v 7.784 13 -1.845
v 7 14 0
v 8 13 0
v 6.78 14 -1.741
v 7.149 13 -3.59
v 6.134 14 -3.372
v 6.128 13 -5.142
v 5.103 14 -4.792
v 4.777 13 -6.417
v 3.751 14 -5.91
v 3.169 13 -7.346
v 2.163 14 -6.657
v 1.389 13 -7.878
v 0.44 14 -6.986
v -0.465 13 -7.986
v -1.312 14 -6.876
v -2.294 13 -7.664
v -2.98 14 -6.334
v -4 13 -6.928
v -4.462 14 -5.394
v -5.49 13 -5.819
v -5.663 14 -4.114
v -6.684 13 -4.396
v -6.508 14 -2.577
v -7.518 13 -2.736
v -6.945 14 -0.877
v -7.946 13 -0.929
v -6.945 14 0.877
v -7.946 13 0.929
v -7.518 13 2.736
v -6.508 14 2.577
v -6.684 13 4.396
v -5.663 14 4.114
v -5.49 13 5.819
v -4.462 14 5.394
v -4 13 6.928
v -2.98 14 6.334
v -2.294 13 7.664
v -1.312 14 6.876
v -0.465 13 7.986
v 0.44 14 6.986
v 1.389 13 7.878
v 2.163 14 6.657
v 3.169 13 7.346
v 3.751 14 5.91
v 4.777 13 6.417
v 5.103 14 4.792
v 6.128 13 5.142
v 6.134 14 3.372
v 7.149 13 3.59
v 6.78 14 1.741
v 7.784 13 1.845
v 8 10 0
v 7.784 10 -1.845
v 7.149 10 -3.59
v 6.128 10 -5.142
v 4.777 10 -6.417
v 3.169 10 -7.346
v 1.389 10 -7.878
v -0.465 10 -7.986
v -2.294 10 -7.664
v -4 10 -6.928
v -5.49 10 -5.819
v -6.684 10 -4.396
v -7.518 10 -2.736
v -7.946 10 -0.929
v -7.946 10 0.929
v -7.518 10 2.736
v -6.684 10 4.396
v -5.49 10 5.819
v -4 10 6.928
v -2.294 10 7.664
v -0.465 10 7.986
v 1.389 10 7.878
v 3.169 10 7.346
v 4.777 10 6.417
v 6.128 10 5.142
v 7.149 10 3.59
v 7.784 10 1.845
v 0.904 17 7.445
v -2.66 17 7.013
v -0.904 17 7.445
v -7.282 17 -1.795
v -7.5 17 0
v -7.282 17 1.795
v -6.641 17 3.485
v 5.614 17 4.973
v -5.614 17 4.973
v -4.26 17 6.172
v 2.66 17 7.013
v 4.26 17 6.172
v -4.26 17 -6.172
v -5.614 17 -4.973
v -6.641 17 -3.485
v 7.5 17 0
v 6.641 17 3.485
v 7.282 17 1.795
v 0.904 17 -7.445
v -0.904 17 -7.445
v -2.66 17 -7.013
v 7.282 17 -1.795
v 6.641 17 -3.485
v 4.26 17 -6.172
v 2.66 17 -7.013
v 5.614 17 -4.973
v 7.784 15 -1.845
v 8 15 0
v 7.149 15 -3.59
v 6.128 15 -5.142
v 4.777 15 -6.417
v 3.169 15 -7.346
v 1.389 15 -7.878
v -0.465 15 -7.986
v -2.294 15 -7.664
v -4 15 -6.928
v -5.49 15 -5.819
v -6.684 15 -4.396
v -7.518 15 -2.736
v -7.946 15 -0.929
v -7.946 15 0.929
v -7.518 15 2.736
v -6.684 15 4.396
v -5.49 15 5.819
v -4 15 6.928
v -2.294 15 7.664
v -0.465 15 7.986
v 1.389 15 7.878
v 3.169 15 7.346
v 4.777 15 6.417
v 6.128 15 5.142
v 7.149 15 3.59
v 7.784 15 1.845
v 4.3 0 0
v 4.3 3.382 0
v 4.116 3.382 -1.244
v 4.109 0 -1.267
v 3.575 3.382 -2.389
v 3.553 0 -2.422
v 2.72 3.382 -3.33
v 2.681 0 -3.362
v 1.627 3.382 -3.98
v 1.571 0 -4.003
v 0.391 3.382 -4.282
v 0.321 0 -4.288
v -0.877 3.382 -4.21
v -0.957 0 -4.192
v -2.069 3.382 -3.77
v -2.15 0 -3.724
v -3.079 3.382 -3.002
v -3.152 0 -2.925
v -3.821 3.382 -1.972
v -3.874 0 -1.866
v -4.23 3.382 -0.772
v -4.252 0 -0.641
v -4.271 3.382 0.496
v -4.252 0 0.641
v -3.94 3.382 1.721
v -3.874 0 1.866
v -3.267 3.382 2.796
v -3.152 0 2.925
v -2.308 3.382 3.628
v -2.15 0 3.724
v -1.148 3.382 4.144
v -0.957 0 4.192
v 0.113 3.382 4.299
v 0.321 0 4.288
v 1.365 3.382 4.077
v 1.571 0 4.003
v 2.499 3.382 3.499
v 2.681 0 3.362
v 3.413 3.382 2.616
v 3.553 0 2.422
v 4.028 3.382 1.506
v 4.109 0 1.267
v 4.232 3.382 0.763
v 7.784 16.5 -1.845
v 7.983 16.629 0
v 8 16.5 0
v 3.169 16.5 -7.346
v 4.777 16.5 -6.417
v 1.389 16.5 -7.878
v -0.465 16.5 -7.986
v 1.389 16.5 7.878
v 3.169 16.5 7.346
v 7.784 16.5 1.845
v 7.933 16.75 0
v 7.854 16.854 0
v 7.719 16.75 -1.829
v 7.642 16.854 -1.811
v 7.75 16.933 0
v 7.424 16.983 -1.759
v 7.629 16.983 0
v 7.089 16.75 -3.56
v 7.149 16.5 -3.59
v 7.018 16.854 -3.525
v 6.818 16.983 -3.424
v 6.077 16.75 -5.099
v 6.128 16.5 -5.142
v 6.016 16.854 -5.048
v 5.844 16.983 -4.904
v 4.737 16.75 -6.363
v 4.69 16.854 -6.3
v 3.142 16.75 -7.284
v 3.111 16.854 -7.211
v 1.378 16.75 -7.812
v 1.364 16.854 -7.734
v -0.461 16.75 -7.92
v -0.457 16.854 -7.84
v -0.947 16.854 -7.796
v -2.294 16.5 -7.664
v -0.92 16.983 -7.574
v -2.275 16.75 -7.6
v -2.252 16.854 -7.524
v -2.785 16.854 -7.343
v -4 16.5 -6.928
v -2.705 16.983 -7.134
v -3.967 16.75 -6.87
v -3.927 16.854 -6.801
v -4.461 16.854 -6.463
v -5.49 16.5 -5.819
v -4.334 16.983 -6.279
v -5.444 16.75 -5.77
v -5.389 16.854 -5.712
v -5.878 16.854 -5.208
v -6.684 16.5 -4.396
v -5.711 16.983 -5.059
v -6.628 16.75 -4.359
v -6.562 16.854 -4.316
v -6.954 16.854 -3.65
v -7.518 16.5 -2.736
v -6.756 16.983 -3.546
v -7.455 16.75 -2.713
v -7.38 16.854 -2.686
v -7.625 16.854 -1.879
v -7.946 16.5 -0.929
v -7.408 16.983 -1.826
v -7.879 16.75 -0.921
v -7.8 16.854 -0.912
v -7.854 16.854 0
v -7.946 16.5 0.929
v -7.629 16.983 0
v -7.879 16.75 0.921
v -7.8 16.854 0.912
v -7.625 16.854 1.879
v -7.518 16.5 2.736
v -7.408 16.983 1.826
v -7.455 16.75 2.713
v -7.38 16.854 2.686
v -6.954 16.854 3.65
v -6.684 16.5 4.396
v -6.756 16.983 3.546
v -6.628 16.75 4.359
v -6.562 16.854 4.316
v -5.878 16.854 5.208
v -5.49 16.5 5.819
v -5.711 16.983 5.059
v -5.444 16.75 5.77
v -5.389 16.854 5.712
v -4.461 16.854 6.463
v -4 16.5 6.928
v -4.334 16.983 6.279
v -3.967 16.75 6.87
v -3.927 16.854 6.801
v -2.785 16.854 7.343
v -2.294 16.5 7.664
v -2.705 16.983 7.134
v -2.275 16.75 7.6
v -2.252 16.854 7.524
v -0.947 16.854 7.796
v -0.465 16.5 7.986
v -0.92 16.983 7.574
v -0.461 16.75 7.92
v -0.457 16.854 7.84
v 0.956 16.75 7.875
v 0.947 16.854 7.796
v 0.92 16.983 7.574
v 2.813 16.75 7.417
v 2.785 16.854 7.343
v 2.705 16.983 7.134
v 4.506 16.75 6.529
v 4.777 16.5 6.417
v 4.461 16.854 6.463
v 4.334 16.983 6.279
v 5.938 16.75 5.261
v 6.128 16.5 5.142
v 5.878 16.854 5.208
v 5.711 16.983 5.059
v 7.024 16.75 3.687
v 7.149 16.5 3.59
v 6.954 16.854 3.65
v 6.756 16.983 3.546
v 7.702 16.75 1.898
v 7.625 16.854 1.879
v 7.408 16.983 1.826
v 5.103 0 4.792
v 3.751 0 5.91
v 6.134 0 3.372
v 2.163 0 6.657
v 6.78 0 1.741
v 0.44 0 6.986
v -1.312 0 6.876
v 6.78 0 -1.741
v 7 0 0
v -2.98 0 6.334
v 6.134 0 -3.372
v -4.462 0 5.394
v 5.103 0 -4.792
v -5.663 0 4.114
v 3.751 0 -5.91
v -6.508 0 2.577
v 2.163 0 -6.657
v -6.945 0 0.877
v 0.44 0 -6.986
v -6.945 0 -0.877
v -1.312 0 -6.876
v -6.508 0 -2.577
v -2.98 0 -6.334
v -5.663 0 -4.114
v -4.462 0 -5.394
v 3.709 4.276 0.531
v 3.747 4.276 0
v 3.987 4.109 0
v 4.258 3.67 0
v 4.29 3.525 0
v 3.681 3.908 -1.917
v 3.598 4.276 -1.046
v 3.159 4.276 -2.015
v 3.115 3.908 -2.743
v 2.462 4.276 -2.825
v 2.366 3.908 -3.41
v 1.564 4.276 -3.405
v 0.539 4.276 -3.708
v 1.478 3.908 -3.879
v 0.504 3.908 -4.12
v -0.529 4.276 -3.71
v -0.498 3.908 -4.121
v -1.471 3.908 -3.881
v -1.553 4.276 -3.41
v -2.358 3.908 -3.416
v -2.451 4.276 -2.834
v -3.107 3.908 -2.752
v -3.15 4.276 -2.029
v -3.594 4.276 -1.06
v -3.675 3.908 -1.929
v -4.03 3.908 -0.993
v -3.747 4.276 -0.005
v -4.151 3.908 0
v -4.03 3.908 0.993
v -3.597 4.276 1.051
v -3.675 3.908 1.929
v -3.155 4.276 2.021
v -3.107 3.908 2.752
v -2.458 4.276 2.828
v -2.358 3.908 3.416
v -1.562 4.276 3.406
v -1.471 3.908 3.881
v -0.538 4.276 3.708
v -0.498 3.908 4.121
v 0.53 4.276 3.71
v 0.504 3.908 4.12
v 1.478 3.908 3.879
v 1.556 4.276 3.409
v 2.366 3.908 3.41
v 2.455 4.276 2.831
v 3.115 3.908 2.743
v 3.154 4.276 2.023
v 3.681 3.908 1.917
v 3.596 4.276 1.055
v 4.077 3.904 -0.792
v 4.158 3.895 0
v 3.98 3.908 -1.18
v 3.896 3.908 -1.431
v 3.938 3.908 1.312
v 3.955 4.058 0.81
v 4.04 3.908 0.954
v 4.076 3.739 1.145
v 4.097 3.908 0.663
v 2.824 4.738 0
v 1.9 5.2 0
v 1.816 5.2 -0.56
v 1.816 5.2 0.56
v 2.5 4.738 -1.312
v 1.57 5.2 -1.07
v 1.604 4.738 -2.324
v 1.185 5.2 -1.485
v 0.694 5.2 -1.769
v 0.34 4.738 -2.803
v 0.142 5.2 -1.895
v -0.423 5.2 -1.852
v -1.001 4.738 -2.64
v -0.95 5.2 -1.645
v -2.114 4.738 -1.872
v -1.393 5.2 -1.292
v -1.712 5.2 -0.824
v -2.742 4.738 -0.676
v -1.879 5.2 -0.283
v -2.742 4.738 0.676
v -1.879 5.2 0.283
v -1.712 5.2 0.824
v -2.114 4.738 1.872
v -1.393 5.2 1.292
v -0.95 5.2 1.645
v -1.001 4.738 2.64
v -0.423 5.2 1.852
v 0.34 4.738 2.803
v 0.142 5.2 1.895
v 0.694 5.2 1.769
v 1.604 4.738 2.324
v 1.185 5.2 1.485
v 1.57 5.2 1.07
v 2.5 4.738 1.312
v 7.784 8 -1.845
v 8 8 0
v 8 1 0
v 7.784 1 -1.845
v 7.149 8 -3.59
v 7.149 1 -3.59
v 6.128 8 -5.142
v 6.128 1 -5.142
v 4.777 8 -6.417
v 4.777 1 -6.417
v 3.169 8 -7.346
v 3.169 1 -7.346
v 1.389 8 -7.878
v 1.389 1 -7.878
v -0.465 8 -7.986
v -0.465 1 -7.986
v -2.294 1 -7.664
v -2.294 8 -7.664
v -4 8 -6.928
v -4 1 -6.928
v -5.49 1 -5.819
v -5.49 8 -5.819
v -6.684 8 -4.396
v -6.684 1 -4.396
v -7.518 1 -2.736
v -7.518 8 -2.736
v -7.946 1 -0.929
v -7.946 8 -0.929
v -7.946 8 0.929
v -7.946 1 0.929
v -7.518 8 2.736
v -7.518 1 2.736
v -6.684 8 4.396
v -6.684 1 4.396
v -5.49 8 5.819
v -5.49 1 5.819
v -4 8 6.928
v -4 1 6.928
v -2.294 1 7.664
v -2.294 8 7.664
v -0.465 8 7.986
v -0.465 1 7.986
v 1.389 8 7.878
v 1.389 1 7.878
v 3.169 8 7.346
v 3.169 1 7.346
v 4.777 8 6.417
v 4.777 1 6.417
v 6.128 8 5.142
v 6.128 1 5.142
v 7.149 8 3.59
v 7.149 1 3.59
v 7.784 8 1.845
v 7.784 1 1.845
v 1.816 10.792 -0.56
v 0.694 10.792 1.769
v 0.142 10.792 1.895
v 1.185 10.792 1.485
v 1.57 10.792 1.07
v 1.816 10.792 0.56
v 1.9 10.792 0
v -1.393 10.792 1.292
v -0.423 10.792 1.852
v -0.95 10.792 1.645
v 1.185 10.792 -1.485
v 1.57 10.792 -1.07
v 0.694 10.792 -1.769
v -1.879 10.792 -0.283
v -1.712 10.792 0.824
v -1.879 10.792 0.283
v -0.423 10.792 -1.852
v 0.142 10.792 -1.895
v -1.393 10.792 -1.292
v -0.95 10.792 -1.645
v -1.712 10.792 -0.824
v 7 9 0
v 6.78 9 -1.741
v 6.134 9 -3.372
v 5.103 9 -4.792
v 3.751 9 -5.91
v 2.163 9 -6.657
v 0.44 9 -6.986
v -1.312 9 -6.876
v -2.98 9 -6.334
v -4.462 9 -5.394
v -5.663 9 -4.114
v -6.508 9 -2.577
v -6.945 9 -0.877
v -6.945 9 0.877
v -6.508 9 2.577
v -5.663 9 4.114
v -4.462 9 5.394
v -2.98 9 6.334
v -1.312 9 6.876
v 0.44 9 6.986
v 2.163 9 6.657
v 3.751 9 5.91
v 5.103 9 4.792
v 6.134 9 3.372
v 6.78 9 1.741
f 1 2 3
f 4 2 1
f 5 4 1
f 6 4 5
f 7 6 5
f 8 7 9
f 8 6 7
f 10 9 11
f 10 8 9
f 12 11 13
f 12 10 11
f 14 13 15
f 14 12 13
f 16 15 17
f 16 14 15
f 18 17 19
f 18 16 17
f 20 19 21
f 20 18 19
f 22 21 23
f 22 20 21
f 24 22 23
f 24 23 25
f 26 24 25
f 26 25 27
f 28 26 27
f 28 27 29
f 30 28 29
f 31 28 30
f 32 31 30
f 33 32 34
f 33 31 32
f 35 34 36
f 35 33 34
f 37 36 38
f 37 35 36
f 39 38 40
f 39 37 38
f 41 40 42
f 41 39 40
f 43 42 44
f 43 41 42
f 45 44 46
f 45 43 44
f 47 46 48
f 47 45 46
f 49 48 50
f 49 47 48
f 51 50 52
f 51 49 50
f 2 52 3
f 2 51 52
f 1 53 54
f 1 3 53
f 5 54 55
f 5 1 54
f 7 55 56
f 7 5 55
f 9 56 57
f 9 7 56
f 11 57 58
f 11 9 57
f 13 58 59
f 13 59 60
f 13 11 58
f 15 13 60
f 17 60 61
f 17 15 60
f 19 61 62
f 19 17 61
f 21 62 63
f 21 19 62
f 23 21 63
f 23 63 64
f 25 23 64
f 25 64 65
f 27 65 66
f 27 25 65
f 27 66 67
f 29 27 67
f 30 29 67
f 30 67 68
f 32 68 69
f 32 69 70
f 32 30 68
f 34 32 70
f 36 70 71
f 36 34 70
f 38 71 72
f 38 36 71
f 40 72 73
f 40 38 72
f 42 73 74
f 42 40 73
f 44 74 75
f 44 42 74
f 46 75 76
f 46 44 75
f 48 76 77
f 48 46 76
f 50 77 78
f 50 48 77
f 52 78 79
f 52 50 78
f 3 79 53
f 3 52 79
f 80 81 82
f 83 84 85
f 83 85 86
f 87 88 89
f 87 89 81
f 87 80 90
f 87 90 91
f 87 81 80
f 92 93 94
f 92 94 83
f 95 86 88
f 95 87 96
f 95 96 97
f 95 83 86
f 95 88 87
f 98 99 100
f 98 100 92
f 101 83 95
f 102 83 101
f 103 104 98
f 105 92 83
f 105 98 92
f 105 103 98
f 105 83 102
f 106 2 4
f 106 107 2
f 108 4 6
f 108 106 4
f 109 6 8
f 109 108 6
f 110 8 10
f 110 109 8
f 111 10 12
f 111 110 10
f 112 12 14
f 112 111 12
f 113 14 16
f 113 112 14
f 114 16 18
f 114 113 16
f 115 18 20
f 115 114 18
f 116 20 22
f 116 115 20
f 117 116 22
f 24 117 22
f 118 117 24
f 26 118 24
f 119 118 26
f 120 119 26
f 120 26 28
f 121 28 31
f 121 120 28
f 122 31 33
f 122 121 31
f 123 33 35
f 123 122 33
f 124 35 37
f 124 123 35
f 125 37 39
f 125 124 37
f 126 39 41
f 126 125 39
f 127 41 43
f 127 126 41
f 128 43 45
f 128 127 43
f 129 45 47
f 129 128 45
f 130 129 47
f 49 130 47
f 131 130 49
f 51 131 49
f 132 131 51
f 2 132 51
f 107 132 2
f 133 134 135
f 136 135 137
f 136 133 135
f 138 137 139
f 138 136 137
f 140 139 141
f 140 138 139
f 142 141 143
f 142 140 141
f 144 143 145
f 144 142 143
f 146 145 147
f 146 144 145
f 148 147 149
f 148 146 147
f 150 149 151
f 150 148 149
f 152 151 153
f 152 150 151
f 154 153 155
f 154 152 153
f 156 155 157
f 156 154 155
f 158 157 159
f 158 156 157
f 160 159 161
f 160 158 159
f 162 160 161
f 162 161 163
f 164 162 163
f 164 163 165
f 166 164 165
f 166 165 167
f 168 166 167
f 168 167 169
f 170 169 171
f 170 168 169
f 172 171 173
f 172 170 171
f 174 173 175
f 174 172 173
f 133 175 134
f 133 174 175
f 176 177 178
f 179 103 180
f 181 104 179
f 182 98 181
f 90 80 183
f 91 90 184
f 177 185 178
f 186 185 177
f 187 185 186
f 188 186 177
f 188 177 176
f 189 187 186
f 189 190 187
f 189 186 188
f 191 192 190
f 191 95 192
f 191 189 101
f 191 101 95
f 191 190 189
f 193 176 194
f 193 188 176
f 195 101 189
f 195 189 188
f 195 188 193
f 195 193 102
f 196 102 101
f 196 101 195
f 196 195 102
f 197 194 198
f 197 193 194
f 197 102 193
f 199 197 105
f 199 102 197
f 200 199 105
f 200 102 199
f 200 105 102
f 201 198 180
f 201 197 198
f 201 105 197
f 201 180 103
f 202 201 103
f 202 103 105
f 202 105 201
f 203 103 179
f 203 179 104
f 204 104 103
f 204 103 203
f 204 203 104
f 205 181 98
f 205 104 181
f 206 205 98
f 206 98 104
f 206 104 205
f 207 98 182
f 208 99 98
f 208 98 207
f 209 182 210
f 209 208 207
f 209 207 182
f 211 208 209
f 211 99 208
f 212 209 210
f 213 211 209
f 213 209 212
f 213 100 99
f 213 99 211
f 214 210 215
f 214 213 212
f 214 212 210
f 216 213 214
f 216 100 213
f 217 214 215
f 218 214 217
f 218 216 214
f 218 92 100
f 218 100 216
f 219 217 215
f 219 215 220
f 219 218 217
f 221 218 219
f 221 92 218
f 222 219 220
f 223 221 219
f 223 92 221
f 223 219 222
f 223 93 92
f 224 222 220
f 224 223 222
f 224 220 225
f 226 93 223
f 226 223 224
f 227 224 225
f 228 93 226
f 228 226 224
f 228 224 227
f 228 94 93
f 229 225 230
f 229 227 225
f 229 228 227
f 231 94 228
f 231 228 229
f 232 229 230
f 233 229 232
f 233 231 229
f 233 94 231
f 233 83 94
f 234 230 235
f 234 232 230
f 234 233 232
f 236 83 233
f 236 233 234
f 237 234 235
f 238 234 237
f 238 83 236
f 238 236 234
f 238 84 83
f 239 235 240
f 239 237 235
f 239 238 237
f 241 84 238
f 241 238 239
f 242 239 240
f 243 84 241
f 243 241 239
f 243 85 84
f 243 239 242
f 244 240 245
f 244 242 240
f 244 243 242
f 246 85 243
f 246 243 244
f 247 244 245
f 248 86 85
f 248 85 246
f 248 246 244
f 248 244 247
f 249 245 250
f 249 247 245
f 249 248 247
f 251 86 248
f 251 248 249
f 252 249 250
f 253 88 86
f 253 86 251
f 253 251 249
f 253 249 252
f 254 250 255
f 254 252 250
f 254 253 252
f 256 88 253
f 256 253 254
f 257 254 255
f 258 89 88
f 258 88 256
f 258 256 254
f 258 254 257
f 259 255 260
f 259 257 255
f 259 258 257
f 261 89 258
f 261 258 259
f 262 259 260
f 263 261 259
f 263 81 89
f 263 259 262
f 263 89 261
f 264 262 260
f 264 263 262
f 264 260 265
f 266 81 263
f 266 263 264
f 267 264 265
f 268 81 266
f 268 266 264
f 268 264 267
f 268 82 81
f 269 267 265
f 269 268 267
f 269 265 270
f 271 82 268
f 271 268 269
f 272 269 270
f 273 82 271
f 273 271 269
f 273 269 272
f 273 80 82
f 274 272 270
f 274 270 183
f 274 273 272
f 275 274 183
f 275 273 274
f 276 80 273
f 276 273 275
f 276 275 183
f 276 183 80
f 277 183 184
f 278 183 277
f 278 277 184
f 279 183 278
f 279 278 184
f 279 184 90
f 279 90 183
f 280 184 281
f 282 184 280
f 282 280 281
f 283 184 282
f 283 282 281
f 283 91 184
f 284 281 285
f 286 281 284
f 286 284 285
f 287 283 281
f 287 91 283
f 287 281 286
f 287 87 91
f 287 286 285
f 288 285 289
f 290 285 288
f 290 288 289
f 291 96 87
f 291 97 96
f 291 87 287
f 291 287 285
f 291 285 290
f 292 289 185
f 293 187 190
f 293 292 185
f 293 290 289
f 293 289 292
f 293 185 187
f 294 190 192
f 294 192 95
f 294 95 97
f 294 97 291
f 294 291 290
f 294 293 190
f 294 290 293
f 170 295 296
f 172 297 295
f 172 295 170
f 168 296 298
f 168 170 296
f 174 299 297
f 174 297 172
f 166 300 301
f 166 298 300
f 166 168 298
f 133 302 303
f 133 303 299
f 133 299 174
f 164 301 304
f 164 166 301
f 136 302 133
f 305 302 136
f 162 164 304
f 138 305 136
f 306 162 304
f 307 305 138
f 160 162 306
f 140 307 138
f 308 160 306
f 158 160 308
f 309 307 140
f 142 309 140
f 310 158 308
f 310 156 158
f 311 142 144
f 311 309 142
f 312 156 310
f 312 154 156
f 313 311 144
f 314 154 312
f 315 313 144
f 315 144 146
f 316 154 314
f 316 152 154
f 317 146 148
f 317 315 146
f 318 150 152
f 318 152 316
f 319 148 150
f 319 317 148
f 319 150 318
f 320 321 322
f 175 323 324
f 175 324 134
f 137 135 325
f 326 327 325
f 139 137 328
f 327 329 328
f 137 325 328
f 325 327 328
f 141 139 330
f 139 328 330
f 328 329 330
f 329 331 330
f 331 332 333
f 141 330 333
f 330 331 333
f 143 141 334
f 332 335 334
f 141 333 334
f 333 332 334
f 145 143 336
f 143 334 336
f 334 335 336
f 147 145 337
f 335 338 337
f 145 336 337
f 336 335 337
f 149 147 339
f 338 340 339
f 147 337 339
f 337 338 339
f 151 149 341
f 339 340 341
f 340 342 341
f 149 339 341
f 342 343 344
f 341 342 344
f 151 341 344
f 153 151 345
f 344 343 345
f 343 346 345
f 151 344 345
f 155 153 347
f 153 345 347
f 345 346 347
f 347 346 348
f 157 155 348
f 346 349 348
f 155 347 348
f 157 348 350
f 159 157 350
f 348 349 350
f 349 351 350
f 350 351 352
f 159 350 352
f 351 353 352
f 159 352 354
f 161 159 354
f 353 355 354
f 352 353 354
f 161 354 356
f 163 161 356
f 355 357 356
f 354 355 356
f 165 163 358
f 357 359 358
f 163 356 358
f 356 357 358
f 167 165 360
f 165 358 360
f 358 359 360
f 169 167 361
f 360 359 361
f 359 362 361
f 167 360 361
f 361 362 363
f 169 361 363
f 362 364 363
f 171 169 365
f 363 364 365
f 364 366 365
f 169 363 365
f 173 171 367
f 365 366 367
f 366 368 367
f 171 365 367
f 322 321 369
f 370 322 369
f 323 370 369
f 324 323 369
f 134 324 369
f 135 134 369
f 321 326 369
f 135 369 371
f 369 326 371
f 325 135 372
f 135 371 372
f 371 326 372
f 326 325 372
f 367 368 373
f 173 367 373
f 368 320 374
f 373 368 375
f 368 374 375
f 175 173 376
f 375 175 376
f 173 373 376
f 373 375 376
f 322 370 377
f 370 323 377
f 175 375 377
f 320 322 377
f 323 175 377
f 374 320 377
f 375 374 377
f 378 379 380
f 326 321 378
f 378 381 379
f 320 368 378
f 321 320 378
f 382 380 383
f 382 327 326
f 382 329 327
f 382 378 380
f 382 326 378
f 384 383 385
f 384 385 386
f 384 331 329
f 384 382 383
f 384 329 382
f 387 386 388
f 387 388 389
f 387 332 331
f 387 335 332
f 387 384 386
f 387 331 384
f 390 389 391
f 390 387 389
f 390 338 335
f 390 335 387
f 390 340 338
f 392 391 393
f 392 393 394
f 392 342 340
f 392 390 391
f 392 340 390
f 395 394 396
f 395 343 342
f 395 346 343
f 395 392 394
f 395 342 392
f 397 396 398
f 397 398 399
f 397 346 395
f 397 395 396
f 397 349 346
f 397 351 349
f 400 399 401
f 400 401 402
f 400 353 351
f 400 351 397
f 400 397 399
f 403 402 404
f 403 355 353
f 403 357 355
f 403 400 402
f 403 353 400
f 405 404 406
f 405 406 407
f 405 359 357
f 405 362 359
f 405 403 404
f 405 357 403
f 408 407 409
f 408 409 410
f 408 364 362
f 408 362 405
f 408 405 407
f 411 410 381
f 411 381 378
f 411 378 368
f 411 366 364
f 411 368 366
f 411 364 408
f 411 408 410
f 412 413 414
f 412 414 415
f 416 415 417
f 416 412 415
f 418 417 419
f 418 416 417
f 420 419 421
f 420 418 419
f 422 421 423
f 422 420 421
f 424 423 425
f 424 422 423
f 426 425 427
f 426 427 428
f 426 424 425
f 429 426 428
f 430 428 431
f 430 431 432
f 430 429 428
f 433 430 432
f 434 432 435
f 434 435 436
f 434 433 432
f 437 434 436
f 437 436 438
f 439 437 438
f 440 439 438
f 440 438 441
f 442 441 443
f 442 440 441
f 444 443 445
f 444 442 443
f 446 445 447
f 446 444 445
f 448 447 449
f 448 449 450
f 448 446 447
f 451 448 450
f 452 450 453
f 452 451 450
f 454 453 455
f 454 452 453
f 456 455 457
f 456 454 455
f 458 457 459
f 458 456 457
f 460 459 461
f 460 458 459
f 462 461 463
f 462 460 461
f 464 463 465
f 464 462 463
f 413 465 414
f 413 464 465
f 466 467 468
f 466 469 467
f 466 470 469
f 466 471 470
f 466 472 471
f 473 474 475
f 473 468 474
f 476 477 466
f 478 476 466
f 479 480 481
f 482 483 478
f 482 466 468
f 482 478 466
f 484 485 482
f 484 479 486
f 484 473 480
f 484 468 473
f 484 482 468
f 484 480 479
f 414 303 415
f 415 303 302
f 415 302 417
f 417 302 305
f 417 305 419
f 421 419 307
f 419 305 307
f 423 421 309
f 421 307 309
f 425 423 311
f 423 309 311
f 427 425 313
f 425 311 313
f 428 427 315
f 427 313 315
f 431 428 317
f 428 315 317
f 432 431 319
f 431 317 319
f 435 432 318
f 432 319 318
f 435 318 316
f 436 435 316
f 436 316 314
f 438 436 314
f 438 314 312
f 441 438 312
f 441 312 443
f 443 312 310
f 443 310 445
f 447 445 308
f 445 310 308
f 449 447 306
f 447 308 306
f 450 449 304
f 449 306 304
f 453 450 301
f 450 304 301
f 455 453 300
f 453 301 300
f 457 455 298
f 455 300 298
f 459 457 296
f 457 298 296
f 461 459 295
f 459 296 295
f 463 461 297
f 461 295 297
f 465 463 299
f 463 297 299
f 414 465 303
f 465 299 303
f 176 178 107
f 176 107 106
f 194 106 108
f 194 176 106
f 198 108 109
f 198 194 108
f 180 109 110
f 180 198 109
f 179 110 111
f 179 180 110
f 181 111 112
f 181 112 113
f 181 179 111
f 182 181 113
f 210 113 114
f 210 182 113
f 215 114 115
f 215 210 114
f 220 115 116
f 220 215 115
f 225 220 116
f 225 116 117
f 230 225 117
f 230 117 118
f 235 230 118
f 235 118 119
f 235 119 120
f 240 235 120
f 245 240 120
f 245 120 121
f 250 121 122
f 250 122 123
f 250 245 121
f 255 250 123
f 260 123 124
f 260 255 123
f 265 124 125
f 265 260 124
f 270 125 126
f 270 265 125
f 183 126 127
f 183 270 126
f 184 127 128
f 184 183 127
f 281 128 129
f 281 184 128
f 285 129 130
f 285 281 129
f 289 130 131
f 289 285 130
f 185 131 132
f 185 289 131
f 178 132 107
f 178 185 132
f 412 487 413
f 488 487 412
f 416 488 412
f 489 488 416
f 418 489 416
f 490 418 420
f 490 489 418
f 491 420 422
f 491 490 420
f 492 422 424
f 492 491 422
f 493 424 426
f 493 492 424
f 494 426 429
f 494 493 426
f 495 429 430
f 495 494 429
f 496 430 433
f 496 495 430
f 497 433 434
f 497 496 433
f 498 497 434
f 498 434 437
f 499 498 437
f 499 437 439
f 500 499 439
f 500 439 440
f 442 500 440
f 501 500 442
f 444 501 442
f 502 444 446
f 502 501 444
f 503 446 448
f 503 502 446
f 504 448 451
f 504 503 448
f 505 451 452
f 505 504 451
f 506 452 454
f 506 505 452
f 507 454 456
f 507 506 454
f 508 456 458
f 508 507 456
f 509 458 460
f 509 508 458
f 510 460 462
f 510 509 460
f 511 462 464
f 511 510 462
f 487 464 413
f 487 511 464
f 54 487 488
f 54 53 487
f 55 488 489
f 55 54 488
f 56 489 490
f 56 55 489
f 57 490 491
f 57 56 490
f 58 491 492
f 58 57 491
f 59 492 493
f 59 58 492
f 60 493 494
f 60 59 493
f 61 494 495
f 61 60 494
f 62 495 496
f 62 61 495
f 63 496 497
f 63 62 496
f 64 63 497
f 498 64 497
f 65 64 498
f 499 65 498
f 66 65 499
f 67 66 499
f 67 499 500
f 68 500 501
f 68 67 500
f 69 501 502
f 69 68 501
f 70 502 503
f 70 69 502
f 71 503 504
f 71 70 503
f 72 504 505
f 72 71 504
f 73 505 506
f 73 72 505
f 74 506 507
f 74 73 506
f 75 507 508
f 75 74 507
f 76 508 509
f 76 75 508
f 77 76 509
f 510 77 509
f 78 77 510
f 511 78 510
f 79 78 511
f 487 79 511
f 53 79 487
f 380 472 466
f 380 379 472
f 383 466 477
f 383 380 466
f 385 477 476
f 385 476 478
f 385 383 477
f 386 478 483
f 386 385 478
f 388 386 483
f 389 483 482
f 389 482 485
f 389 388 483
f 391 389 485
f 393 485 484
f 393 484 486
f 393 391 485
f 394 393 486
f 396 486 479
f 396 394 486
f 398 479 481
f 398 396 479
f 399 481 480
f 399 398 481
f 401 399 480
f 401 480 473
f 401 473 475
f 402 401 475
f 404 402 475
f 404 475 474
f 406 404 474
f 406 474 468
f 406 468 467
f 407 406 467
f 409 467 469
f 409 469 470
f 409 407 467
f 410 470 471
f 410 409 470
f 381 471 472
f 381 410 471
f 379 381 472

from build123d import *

# Parameters (mm, degrees)
F2_R    = 1
F3_R    = 0.5
F4_SIZE = 1


with BuildPart() as f1:
    # F0 (on Top) → F1 (revolve)
    with BuildSketch(Plane.XY):
        Polygon((1.9, 10.791767), (1.9, 5.2), (4.3, 4), (4.3, 0), (8, 0), (8, 8), (7, 9), (8, 10), (8, 13), (7, 14), (8, 15), (8, 17), (0, 17), (0, 10.791767), align=None)
    revolve(axis=Axis((0, 8.531952, 0), (0, 1, 0)))

    # F2
    f2_edges = [f1.edges().sort_by_distance(p)[0] for p in [
        (-4.3, 4, 0),
    ]]
    fillet(f2_edges, radius=F2_R)

    # F3
    f3_edges = [f1.edges().sort_by_distance(p)[0] for p in [
        (-8, 17, 0),
    ]]
    fillet(f3_edges, radius=F3_R)

    # F4
    f4_edges = [f1.edges().sort_by_distance(p)[0] for p in [
        (-8, 0, 0),
    ]]
    chamfer(f4_edges, length=F4_SIZE)


solid = f1.part
